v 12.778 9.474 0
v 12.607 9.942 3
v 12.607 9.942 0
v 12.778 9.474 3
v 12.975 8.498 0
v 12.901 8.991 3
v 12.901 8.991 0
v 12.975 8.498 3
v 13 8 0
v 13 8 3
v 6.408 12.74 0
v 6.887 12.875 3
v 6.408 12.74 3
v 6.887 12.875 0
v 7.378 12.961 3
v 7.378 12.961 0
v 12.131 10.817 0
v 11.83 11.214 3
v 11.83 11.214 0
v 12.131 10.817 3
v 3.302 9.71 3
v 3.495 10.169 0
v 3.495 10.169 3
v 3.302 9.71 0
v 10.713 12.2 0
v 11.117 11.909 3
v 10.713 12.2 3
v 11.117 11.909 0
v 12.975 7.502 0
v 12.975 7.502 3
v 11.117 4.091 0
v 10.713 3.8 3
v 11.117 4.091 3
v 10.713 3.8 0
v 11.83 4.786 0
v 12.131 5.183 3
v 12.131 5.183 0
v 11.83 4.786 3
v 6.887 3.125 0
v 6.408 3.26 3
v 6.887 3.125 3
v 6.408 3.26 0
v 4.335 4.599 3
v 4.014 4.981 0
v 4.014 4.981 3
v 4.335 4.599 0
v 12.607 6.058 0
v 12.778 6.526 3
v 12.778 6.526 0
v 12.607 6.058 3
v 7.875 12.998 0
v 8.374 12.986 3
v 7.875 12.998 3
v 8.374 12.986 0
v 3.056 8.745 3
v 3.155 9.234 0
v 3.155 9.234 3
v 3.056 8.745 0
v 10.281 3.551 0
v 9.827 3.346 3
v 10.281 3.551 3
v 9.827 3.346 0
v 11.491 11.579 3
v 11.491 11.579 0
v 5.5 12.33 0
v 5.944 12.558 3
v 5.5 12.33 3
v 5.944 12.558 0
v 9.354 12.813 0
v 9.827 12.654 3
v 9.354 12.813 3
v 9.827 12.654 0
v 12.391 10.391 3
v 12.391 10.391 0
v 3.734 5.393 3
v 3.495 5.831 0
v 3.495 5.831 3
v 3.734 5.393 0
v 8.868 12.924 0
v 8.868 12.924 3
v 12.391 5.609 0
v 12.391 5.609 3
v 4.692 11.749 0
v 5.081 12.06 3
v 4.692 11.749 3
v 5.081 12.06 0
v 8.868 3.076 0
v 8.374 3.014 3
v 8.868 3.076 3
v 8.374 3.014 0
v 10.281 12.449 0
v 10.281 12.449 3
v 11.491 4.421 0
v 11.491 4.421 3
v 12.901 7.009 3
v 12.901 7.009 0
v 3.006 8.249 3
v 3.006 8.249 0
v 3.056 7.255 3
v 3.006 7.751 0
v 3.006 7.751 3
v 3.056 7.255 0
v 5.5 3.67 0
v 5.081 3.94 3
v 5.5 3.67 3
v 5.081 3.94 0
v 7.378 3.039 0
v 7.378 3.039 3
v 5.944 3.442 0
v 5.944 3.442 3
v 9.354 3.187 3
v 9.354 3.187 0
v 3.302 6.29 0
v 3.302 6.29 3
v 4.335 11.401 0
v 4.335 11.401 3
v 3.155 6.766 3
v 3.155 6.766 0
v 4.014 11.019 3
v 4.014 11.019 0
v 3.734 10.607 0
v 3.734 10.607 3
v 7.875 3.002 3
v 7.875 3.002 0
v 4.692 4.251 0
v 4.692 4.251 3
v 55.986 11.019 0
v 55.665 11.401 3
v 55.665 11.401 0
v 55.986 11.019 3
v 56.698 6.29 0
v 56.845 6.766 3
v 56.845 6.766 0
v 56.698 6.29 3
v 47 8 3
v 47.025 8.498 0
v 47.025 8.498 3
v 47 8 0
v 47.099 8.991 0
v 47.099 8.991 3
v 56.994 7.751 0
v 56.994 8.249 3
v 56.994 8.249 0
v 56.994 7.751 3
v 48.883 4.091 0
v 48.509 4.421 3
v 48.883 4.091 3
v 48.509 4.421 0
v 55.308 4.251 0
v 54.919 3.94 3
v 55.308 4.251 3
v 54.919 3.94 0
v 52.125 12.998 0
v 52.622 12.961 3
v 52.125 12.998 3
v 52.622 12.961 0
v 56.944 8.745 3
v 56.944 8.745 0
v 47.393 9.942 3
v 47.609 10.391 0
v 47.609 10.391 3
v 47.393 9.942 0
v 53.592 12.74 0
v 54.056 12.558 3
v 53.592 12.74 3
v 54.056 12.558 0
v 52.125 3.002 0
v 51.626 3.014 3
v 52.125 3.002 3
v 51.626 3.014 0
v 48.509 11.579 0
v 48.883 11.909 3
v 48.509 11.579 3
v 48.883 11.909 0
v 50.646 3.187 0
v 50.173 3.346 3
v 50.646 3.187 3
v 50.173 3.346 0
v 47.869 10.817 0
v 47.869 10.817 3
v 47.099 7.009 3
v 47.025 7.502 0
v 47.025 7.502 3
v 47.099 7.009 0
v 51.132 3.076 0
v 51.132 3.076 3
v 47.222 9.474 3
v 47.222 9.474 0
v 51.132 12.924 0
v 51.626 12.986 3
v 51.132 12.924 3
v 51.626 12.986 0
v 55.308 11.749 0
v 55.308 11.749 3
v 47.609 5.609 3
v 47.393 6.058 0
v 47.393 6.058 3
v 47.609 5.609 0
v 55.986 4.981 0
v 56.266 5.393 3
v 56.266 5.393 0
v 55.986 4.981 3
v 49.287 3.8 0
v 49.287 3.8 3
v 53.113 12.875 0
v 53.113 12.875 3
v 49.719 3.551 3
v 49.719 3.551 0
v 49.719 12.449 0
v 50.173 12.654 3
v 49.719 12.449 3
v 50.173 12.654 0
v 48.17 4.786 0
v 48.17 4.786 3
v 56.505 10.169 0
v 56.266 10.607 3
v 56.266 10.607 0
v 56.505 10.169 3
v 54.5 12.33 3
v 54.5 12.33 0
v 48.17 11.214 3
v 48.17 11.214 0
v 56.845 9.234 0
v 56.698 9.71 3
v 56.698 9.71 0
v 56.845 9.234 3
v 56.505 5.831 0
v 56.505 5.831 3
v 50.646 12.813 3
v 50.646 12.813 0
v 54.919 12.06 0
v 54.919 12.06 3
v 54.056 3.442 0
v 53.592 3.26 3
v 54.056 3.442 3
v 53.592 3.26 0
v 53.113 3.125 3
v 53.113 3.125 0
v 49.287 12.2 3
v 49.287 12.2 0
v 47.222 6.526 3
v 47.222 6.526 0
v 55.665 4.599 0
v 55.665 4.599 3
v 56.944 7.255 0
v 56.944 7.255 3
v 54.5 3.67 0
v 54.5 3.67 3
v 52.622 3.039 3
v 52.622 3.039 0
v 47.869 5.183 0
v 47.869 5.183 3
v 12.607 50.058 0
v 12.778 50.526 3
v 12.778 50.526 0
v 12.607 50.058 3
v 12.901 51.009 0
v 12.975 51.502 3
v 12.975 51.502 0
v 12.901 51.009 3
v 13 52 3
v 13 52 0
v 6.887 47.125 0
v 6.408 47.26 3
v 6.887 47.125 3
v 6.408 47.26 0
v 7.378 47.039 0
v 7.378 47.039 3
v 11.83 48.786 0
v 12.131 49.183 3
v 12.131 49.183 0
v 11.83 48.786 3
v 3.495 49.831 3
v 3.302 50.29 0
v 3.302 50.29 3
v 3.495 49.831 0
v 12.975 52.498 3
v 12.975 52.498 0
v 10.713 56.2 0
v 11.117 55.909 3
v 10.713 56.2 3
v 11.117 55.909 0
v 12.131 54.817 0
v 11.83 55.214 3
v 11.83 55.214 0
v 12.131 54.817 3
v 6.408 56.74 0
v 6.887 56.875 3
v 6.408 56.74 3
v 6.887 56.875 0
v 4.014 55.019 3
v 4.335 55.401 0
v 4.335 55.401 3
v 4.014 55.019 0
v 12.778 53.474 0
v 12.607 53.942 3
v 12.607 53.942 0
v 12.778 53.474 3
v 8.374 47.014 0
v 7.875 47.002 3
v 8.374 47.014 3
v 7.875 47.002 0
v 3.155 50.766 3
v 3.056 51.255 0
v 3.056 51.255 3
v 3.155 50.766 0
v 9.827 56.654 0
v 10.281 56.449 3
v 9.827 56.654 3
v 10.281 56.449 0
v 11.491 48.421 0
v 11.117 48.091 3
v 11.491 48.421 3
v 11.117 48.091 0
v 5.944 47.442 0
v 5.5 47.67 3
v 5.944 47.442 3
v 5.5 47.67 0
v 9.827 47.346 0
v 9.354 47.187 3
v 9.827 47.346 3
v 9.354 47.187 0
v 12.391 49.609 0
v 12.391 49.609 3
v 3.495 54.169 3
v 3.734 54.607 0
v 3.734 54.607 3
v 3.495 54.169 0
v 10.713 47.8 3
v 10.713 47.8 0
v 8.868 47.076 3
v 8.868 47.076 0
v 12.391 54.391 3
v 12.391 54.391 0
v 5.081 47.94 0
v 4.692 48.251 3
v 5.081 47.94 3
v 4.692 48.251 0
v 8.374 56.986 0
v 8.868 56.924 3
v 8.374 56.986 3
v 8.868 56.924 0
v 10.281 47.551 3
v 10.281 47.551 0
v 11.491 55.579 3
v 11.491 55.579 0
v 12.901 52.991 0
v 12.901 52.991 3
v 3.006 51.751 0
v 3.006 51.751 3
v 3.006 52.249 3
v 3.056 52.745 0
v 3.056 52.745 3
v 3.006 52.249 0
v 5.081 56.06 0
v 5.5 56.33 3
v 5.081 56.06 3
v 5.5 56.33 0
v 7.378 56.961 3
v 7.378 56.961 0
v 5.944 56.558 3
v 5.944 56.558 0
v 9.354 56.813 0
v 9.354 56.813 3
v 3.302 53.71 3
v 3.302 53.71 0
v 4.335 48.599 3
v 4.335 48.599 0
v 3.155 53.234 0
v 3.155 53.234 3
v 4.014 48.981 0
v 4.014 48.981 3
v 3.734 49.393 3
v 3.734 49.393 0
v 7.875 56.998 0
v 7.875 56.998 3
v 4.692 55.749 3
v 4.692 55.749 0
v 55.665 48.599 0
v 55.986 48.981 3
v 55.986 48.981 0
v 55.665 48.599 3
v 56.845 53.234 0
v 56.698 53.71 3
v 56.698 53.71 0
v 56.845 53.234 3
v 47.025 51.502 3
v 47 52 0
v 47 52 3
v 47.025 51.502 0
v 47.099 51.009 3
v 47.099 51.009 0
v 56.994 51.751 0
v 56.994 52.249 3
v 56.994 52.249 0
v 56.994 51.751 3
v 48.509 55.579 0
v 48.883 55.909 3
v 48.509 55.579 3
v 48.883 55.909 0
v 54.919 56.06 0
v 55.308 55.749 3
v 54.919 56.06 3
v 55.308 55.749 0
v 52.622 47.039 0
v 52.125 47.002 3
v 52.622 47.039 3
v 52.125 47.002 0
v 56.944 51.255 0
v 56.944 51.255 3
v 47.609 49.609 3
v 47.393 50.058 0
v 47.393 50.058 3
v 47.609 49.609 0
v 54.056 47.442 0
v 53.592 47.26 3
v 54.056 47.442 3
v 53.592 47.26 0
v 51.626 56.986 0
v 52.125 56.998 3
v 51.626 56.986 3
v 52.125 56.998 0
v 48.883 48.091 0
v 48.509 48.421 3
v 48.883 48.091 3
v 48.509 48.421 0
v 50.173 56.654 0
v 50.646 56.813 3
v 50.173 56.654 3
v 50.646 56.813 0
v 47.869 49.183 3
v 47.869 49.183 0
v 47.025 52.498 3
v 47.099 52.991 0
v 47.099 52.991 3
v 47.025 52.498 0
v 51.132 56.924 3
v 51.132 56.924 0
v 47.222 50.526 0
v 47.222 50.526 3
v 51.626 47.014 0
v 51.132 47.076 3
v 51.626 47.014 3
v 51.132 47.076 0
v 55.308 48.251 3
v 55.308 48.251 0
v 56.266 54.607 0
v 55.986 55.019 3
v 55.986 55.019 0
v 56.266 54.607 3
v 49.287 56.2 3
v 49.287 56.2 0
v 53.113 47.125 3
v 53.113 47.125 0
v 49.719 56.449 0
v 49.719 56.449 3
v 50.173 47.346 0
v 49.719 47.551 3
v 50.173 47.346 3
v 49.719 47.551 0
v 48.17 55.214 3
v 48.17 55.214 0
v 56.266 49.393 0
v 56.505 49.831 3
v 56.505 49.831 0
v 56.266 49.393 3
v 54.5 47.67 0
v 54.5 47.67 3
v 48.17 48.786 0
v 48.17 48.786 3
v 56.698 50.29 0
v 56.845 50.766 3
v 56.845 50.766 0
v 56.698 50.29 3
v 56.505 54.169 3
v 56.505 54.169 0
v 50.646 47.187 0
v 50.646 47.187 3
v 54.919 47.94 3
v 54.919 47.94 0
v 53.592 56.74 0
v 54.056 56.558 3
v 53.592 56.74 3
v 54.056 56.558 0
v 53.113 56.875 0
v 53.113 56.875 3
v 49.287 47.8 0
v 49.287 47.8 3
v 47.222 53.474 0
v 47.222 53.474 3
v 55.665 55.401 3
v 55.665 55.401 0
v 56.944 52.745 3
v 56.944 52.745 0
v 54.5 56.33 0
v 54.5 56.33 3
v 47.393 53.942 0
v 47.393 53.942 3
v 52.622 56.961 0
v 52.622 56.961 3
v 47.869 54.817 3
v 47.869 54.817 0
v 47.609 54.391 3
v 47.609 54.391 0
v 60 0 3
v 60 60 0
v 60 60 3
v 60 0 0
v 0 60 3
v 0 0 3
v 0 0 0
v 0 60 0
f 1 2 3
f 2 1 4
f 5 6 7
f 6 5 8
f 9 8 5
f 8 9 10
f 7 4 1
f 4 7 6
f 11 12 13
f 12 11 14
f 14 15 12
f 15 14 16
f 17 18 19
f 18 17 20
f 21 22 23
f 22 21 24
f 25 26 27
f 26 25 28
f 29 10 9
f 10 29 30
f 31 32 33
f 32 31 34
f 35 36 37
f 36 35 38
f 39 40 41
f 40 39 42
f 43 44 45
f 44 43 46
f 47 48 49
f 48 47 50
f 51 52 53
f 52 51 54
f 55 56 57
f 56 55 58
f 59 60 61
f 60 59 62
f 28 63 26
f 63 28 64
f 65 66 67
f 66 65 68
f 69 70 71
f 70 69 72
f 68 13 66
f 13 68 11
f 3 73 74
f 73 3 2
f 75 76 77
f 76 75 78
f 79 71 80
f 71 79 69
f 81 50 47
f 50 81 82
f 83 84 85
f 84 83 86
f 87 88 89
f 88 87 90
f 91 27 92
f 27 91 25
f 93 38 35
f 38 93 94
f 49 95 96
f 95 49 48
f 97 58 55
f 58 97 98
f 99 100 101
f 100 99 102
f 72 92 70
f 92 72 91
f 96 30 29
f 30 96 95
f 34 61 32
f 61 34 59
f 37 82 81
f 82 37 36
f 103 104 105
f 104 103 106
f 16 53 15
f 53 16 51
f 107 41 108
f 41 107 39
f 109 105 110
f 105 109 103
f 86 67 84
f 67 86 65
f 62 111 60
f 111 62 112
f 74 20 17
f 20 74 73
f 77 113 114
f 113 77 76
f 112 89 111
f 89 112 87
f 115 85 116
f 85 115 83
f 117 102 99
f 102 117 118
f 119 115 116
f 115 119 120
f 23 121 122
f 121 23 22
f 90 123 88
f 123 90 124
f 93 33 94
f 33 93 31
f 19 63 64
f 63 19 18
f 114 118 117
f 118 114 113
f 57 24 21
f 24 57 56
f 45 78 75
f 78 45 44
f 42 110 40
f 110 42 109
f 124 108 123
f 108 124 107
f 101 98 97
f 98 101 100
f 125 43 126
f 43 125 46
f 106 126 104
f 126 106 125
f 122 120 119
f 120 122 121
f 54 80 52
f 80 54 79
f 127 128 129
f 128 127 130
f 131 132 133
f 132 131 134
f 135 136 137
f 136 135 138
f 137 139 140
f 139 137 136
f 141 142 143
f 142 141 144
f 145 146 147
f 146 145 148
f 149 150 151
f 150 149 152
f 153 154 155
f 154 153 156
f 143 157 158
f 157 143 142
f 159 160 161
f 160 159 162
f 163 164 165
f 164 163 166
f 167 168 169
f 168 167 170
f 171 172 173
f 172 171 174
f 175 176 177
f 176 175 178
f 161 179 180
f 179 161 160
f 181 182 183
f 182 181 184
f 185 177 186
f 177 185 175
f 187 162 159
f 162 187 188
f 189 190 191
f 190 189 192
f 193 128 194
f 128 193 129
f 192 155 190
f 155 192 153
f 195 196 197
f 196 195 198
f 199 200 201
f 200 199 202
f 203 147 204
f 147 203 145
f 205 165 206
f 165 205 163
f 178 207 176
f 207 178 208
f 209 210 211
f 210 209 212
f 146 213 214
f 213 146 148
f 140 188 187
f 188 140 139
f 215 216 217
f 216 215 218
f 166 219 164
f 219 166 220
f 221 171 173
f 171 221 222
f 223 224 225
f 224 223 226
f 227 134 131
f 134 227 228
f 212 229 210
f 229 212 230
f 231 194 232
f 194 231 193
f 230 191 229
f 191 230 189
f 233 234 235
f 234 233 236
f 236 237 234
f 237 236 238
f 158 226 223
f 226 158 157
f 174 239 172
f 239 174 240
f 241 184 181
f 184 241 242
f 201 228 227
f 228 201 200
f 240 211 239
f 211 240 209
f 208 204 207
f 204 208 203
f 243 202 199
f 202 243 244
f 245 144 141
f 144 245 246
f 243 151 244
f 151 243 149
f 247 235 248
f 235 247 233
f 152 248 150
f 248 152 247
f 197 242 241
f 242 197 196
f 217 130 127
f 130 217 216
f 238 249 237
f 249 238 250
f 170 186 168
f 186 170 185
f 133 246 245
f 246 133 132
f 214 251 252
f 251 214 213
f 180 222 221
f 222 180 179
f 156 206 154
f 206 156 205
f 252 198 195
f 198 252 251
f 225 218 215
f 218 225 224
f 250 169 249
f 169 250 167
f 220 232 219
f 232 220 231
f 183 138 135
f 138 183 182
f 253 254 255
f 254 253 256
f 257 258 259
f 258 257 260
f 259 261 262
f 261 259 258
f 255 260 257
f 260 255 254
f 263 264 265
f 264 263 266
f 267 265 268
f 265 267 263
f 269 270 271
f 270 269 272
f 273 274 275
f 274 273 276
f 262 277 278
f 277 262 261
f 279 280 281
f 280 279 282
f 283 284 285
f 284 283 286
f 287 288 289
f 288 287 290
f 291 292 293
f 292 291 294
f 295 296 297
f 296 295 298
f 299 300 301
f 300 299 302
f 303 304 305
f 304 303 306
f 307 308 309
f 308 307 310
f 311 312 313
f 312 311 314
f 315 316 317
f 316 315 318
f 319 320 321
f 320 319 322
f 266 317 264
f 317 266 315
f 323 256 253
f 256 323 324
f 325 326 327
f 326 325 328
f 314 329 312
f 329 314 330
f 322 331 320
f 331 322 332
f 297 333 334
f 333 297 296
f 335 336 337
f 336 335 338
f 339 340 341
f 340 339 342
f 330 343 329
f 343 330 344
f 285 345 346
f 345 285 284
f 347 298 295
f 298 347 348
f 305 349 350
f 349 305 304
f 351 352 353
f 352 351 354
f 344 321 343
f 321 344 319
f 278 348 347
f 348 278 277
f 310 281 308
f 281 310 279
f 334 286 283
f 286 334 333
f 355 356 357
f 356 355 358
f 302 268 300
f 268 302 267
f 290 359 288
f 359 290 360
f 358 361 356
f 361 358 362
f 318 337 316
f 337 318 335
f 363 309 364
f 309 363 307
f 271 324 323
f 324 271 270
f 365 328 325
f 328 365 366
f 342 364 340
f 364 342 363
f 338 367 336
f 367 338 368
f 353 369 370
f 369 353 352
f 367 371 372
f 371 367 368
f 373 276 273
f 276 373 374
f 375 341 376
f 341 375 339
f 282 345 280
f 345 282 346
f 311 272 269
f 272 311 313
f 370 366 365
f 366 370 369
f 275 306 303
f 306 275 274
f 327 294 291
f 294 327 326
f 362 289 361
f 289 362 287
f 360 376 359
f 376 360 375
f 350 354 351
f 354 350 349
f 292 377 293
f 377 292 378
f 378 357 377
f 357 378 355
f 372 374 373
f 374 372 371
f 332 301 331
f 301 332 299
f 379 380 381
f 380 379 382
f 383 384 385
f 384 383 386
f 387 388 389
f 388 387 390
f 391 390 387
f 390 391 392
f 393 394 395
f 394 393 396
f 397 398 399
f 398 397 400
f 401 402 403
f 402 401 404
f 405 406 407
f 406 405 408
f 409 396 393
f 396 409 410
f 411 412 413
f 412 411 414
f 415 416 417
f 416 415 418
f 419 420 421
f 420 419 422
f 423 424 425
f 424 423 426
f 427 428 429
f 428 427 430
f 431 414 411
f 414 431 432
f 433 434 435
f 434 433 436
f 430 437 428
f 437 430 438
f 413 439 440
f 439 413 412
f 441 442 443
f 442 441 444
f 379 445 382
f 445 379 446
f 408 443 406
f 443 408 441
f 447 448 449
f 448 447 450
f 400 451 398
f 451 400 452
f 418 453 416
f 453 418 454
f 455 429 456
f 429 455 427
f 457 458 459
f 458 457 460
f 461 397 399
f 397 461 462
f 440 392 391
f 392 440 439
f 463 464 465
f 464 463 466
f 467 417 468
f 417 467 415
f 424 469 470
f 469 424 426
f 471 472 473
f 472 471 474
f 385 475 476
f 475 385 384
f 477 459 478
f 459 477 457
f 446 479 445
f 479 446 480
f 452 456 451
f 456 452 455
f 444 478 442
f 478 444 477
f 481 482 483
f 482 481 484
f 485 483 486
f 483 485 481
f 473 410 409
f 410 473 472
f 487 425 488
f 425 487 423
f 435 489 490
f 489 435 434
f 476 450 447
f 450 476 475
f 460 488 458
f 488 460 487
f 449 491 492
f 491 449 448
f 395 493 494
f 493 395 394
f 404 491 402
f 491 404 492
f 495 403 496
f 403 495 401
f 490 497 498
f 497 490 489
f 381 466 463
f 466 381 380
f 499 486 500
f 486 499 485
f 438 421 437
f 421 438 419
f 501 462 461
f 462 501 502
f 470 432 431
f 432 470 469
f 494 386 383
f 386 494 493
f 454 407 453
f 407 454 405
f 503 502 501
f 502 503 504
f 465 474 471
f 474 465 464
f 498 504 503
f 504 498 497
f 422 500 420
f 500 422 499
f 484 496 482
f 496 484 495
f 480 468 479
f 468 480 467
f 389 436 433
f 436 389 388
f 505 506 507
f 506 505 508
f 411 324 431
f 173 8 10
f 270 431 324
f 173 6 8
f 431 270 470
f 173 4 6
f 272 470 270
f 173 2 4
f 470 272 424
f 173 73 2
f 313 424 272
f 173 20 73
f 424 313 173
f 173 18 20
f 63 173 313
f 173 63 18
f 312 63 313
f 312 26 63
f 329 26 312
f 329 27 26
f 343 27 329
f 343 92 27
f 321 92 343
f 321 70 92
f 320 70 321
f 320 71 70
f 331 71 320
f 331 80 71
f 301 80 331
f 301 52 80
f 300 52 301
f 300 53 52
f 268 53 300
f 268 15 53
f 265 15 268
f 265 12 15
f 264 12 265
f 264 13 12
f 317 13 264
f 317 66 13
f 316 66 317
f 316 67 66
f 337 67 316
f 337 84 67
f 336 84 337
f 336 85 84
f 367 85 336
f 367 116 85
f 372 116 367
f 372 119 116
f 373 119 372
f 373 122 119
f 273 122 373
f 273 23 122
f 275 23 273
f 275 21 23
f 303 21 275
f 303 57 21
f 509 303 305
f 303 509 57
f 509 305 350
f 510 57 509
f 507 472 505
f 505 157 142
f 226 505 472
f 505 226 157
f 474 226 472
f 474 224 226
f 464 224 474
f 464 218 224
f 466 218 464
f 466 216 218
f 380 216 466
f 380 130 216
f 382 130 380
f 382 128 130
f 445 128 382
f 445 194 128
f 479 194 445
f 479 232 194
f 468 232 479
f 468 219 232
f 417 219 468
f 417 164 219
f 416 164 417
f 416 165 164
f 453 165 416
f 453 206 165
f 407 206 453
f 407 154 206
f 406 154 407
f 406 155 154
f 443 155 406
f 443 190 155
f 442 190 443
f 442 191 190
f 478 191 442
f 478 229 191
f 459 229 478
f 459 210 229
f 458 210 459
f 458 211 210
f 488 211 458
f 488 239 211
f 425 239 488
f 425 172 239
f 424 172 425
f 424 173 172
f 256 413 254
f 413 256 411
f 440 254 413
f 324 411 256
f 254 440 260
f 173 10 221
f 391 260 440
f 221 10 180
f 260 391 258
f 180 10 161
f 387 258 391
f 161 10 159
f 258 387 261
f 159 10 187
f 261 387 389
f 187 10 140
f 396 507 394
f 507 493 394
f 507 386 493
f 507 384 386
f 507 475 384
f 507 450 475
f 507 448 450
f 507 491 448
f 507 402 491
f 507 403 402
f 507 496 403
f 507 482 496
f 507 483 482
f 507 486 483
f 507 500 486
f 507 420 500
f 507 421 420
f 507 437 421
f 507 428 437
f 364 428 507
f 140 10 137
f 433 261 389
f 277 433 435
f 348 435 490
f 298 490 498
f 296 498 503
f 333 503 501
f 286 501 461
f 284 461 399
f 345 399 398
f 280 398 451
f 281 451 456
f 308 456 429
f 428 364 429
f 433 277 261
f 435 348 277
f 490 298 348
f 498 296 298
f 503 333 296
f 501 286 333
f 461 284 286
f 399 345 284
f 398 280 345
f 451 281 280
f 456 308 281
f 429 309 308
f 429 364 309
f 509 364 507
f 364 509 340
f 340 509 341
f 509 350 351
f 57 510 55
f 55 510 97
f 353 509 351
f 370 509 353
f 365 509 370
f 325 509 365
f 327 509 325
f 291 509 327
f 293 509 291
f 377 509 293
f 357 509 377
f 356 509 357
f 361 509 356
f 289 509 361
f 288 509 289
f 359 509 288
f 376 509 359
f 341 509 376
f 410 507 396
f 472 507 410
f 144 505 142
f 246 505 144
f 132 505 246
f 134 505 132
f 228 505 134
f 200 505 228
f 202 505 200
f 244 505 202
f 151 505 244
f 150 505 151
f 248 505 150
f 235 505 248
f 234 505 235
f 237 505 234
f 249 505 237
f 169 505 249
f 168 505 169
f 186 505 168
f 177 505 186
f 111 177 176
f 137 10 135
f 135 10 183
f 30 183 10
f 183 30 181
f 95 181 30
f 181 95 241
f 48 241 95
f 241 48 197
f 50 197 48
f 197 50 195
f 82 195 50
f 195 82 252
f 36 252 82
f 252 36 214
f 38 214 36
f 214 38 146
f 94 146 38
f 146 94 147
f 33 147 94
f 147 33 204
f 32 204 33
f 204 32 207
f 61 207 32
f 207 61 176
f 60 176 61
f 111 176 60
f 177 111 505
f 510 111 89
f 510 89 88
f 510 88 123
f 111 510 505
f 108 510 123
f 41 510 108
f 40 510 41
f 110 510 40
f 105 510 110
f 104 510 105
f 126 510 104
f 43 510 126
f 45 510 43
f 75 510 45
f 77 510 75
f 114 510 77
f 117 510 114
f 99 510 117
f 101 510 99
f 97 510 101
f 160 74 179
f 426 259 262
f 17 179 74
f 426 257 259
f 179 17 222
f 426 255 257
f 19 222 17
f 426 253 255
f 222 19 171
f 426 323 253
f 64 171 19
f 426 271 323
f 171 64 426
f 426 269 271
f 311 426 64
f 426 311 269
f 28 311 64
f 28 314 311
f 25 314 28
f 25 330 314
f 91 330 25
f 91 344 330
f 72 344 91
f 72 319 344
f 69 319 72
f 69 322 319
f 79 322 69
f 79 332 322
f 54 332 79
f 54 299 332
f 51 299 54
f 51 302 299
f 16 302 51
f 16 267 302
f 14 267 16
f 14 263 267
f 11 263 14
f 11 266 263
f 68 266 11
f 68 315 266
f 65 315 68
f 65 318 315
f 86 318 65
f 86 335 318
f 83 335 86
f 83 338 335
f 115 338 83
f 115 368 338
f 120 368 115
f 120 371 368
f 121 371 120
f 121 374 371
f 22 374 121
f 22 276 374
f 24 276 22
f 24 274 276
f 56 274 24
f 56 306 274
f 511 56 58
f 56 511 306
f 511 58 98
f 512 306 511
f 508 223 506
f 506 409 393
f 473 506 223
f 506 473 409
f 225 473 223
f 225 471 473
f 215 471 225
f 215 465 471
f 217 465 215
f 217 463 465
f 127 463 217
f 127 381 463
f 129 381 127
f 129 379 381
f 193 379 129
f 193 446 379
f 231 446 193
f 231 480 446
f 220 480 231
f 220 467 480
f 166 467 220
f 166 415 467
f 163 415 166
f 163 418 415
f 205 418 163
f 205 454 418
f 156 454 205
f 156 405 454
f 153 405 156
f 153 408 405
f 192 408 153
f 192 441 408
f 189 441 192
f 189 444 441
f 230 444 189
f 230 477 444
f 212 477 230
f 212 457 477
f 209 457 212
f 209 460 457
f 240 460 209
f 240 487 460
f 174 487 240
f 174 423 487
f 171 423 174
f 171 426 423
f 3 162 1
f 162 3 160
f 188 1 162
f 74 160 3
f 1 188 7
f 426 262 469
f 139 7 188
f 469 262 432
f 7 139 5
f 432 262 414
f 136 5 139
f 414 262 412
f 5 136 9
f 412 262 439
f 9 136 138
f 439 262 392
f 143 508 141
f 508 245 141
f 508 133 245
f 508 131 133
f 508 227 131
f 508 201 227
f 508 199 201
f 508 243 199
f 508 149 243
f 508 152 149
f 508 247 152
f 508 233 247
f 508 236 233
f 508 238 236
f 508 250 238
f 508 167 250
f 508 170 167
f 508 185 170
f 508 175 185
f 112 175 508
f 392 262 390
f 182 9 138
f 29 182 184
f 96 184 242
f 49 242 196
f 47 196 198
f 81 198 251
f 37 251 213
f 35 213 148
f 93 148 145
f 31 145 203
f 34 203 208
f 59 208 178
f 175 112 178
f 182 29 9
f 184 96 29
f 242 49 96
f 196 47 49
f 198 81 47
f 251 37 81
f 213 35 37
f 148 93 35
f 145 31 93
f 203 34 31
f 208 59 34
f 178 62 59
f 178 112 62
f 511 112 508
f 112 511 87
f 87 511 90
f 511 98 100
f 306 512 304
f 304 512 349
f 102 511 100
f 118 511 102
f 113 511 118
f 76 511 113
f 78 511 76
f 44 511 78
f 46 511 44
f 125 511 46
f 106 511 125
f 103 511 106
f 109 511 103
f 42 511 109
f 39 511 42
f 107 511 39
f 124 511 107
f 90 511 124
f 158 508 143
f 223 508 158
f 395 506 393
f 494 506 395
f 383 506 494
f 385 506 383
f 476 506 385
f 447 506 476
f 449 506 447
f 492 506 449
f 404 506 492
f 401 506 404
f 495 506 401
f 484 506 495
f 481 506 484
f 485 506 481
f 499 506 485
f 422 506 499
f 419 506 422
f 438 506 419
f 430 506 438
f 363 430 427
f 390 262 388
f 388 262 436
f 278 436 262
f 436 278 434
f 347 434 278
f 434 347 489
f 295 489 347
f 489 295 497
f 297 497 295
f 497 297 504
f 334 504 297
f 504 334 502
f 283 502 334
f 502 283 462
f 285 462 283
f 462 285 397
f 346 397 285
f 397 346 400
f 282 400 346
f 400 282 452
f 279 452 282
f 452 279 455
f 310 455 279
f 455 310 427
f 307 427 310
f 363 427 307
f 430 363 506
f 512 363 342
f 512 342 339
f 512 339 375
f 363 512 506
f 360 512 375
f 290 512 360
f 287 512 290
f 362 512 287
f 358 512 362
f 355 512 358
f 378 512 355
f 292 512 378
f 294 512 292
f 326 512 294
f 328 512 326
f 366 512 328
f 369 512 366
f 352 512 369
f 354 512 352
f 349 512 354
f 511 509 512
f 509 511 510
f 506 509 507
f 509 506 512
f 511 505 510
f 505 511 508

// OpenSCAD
$fa=3.000000;
$fs=0.500000;
difference(){cube([60,60,3]);union(){union(){translate([8,8,0])translate([0,0,-5000])cylinder(d=10,h=10000);translate([30,0,0])mirror([1,0,0])translate([-30,0,0])translate([8,8,0])translate([0,0,-5000])cylinder(d=10,h=10000);}translate([0,30,0])mirror([0,1,0])translate([0,-30,0])union(){translate([8,8,0])translate([0,0,-5000])cylinder(d=10,h=10000);translate([30,0,0])mirror([1,0,0])translate([-30,0,0])translate([8,8,0])translate([0,0,-5000])cylinder(d=10,h=10000);}}}
